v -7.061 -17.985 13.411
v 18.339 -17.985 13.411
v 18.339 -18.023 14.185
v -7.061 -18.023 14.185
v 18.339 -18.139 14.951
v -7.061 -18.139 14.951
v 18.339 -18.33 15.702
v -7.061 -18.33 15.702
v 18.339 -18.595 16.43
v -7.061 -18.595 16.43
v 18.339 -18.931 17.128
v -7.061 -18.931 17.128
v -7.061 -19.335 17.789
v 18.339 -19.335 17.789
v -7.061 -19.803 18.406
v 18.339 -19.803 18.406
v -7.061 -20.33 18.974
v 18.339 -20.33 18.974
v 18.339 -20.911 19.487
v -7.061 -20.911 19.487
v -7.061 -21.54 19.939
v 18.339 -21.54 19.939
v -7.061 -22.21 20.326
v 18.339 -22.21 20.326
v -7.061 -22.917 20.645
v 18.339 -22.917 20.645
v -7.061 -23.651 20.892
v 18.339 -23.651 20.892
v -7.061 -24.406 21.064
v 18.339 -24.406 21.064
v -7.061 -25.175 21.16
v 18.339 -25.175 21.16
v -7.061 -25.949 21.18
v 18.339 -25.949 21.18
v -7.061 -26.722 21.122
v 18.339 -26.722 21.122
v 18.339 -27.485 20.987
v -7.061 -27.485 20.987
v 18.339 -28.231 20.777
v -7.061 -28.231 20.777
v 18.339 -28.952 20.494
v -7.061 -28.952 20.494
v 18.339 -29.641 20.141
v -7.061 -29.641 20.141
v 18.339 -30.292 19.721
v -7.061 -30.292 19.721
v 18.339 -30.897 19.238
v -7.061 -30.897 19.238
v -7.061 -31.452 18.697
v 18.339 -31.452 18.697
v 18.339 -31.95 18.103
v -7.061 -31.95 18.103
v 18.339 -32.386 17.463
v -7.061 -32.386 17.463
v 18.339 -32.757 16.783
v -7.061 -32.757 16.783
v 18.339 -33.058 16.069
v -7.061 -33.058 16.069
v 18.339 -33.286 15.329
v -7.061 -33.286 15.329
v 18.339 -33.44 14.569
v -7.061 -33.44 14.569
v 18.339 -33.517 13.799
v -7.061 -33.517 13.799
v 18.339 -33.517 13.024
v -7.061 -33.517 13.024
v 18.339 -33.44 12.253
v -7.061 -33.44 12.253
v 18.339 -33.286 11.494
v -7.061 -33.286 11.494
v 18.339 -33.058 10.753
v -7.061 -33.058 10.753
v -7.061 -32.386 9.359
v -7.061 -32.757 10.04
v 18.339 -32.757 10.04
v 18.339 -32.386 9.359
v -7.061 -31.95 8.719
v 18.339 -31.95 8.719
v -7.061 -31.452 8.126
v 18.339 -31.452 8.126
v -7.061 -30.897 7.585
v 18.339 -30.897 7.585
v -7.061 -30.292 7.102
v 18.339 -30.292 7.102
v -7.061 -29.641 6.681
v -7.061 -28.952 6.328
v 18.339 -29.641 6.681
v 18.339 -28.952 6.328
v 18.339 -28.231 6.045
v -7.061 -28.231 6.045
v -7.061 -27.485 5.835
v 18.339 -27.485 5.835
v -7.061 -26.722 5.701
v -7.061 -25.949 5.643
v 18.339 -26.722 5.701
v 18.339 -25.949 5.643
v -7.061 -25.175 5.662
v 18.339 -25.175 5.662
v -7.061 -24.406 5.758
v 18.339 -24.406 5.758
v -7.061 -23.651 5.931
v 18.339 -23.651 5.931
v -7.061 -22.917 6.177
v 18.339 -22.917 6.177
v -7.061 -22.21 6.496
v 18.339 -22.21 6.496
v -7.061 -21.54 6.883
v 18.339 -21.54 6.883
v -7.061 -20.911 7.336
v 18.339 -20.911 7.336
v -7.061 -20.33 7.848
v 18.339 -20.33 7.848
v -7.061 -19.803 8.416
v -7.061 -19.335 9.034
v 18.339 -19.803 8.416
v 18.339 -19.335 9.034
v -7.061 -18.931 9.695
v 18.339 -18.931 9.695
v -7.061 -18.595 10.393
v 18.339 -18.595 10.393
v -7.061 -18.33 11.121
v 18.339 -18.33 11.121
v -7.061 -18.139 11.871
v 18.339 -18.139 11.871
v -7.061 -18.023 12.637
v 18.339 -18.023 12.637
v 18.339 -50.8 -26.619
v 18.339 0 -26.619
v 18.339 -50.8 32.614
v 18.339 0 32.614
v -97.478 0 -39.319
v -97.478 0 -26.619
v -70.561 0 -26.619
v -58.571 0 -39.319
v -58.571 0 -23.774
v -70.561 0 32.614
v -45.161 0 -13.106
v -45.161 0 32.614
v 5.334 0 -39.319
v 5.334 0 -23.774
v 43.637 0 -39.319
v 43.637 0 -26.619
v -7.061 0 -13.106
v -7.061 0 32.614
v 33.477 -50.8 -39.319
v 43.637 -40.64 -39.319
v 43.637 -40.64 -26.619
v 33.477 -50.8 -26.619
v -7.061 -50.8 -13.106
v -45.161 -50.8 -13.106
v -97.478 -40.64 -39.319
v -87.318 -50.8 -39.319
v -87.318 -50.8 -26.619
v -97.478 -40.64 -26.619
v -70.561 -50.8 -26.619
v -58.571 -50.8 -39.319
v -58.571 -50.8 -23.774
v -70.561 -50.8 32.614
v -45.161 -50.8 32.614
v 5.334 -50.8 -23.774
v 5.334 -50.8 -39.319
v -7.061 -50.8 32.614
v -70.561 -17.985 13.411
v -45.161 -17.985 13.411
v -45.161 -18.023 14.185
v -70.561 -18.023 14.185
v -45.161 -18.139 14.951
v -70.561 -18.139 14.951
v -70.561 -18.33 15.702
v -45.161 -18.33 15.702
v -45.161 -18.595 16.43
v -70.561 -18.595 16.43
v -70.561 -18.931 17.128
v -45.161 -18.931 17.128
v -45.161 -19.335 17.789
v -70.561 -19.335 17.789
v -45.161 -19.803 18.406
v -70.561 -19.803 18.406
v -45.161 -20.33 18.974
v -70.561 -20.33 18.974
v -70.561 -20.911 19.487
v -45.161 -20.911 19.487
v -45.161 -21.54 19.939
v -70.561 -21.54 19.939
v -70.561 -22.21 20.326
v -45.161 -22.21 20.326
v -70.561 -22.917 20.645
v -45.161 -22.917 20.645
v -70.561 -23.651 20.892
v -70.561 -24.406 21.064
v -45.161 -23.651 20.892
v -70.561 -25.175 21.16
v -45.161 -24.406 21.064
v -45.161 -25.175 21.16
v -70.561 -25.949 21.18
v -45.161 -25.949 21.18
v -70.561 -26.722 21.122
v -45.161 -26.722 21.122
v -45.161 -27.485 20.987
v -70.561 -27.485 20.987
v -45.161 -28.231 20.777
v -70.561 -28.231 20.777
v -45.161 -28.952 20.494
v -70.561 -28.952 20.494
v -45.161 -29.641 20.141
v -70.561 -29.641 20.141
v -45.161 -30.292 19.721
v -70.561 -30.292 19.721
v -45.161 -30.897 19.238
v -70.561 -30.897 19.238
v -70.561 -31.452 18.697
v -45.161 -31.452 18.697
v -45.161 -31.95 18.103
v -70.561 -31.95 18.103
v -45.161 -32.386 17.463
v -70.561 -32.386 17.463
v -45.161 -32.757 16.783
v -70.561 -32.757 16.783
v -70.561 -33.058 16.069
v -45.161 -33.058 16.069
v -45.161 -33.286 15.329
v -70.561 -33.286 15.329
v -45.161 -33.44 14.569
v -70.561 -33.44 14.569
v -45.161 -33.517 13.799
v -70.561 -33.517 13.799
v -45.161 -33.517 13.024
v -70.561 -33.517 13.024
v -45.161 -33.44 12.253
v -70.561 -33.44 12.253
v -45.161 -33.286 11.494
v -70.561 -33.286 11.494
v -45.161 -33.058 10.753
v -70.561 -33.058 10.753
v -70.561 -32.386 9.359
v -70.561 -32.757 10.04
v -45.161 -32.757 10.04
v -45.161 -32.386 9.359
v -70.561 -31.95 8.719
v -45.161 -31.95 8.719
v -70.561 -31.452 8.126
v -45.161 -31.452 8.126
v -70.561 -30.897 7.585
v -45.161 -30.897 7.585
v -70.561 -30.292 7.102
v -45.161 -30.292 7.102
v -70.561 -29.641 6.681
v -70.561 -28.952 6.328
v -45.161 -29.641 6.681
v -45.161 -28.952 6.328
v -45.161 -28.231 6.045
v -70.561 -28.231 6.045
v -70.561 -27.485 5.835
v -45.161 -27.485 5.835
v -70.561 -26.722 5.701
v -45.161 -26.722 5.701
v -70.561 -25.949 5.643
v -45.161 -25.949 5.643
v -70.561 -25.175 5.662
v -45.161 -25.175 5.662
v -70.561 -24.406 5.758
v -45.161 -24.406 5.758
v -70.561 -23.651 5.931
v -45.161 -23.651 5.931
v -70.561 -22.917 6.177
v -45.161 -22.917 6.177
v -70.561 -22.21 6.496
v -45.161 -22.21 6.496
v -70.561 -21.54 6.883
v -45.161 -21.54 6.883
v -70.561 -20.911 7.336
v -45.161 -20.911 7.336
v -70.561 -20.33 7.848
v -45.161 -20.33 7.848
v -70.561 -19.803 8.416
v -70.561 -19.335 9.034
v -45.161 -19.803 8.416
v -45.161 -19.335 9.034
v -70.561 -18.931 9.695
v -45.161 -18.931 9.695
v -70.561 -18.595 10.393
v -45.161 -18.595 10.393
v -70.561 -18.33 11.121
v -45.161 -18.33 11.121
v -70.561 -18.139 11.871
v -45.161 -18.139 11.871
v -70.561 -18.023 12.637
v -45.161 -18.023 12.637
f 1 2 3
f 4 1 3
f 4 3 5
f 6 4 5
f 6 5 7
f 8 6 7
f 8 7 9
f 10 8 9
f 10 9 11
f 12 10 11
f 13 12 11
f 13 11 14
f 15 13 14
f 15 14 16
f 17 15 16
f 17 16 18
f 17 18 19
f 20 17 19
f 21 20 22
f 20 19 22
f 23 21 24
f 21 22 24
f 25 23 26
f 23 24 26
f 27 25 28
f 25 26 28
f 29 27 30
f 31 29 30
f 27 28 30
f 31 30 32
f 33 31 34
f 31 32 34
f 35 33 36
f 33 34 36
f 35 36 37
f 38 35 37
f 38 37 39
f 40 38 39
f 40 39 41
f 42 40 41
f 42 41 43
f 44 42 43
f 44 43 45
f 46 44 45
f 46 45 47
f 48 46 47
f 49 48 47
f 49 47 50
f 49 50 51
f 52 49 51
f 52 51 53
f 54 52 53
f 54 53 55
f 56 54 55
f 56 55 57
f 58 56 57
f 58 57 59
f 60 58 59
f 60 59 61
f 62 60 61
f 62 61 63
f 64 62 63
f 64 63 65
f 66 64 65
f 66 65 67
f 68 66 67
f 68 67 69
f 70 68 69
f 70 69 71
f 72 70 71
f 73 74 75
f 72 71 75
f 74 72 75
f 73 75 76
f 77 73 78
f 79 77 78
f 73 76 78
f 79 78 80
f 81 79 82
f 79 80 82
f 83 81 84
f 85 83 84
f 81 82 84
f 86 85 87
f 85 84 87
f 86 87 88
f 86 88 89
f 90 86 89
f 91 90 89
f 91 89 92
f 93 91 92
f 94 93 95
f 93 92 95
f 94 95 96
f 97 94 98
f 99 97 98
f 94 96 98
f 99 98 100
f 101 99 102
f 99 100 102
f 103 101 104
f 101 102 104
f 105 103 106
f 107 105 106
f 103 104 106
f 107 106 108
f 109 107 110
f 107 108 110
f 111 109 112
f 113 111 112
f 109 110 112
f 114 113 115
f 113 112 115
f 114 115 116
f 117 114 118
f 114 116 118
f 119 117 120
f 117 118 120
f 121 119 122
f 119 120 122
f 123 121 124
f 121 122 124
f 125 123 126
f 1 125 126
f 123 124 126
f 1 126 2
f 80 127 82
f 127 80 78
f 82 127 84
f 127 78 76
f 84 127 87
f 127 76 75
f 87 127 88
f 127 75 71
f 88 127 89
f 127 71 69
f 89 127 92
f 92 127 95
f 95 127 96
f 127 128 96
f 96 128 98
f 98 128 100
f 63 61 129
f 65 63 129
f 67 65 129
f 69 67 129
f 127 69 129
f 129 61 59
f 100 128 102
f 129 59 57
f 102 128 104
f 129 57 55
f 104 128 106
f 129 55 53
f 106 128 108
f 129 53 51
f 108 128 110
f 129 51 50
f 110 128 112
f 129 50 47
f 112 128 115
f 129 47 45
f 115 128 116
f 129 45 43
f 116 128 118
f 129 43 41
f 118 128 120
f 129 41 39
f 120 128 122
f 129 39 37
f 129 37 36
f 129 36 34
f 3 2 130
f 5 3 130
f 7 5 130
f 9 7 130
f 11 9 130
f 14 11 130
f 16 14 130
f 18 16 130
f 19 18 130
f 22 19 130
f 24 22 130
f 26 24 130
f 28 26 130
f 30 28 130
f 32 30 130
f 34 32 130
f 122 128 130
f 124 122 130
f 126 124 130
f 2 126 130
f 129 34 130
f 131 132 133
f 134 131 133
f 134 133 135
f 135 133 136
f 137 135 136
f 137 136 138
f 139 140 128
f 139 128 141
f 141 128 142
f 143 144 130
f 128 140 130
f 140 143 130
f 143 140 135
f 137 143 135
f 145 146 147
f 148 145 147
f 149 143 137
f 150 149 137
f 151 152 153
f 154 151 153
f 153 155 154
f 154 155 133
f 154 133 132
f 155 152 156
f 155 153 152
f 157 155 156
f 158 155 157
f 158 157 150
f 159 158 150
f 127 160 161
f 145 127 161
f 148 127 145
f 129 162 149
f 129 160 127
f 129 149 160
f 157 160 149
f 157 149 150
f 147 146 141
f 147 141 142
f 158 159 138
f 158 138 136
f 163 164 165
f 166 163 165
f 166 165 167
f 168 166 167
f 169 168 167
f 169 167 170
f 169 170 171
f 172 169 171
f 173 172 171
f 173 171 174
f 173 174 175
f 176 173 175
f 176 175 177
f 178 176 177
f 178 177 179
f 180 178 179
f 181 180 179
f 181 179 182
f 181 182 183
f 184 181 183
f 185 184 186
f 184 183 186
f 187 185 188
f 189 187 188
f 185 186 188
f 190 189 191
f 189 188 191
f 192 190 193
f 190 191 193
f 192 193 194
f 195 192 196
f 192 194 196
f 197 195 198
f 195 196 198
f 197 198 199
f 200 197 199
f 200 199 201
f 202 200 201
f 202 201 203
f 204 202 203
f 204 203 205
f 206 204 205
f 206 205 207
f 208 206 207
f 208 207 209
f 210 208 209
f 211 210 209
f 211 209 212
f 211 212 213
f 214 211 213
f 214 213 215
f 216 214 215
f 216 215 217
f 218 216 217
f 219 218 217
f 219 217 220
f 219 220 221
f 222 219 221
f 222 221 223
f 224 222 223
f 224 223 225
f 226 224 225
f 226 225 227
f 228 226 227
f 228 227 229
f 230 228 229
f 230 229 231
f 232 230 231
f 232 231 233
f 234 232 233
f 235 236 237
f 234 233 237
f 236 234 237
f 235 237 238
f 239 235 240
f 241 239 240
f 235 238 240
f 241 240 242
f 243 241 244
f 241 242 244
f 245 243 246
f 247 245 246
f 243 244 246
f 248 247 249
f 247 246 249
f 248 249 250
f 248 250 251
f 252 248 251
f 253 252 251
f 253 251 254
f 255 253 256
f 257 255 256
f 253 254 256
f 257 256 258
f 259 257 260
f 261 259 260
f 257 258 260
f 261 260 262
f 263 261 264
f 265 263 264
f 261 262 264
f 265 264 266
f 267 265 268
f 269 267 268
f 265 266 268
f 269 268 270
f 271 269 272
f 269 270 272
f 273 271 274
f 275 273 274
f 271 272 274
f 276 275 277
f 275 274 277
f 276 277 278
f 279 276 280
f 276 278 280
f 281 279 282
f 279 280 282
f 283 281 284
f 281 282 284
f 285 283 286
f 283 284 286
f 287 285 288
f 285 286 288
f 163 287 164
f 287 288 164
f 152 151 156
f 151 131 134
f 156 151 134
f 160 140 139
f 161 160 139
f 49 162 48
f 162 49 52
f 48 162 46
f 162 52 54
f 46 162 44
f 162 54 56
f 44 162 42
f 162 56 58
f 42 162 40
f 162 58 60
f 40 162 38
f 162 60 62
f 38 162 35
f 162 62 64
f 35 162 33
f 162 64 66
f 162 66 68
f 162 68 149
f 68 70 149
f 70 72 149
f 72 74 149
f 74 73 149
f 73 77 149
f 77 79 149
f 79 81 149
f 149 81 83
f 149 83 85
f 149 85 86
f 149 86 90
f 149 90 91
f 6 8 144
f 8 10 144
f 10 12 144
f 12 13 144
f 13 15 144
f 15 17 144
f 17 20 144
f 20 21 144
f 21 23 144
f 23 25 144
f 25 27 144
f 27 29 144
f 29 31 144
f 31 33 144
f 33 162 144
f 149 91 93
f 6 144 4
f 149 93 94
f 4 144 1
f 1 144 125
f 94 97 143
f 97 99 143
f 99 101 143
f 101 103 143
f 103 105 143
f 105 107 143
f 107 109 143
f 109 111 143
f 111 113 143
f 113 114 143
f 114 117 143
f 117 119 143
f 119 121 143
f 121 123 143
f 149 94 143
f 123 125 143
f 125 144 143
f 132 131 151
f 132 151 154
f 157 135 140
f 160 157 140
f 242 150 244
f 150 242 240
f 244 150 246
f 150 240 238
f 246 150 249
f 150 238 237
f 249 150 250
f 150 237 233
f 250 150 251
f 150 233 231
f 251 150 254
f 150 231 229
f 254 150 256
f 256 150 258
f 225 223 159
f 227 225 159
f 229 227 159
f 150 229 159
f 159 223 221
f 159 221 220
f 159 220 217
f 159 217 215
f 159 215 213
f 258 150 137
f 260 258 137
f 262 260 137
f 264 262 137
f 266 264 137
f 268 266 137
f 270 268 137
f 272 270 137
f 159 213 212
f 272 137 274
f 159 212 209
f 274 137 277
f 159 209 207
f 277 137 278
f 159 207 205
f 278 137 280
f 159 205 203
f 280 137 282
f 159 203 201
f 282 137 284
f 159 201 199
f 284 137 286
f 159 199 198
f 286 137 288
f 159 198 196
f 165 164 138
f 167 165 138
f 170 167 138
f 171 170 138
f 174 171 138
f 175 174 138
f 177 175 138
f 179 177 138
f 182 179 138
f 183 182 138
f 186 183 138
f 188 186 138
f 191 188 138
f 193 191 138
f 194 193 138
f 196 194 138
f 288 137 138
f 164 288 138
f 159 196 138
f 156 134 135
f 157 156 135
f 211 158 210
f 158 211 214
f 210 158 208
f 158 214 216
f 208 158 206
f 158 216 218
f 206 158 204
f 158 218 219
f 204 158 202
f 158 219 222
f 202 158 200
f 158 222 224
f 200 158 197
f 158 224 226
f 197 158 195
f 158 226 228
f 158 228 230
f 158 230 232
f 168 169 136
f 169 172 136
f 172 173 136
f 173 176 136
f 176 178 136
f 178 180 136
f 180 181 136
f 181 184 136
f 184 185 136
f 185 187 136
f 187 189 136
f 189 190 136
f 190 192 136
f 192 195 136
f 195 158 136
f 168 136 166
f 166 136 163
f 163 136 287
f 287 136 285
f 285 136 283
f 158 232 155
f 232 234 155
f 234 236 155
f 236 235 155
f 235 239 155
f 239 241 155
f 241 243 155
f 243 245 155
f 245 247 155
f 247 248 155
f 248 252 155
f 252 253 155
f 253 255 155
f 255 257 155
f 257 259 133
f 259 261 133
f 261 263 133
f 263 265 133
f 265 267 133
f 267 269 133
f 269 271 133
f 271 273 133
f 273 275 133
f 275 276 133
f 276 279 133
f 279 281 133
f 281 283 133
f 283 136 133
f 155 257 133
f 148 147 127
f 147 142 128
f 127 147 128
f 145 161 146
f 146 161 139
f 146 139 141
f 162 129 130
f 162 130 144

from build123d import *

# Parameters (mm, degrees)
F0_W     = 12.7
F0_H     = 12.7
F1_DEPTH = 50.8
F2_SIZE  = 10.16
F3_SIZE  = 10.16
F4_R     = 7.770906
F5_DEPTH = 99.568


with BuildPart() as f1:
    # F0 (on Front) → F1 (new body)
    with BuildSketch(Plane.XZ):
        with Locations((37.287199, -32.969202)):
            Rectangle(F0_W, F0_H)
        with Locations((-91.128487, -32.969202)):
            Rectangle(F0_W, F0_H)
        Polygon((-84.778487, -26.619202), (-84.778487, -39.319202), (-58.57092, -39.319202), (-58.57092, -23.7744), (5.334001, -23.7744), (5.334001, -39.319202), (30.937199, -39.319202), (30.937199, -26.619202), (18.3388, -26.619202), (18.3388, 32.613602), (-7.0612, 32.613602), (-7.0612, -13.1064), (-45.1612, -13.1064), (-45.1612, 32.613602), (-70.5612, 32.613602), (-70.5612, -26.619202), align=None)
    extrude(amount=F1_DEPTH)

    # F2
    f2_edges = [f1.edges().sort_by_distance(p)[0] for p in [
        (43.637199, -50.8, -32.969202),
    ]]
    chamfer(f2_edges, length=F2_SIZE)

    # F3
    f3_edges = [f1.edges().sort_by_distance(p)[0] for p in [
        (-97.478487, -50.8, -32.969202),
    ]]
    chamfer(f3_edges, length=F3_SIZE)

    # F4 (on face) → F5 (cut)
    with BuildSketch(Plane.YZ.offset(18.3388)):
        with Locations((-25.755601, 13.411201)):
            Circle(F4_R)
    extrude(amount=-F5_DEPTH, mode=Mode.SUBTRACT)


solid = f1.part
